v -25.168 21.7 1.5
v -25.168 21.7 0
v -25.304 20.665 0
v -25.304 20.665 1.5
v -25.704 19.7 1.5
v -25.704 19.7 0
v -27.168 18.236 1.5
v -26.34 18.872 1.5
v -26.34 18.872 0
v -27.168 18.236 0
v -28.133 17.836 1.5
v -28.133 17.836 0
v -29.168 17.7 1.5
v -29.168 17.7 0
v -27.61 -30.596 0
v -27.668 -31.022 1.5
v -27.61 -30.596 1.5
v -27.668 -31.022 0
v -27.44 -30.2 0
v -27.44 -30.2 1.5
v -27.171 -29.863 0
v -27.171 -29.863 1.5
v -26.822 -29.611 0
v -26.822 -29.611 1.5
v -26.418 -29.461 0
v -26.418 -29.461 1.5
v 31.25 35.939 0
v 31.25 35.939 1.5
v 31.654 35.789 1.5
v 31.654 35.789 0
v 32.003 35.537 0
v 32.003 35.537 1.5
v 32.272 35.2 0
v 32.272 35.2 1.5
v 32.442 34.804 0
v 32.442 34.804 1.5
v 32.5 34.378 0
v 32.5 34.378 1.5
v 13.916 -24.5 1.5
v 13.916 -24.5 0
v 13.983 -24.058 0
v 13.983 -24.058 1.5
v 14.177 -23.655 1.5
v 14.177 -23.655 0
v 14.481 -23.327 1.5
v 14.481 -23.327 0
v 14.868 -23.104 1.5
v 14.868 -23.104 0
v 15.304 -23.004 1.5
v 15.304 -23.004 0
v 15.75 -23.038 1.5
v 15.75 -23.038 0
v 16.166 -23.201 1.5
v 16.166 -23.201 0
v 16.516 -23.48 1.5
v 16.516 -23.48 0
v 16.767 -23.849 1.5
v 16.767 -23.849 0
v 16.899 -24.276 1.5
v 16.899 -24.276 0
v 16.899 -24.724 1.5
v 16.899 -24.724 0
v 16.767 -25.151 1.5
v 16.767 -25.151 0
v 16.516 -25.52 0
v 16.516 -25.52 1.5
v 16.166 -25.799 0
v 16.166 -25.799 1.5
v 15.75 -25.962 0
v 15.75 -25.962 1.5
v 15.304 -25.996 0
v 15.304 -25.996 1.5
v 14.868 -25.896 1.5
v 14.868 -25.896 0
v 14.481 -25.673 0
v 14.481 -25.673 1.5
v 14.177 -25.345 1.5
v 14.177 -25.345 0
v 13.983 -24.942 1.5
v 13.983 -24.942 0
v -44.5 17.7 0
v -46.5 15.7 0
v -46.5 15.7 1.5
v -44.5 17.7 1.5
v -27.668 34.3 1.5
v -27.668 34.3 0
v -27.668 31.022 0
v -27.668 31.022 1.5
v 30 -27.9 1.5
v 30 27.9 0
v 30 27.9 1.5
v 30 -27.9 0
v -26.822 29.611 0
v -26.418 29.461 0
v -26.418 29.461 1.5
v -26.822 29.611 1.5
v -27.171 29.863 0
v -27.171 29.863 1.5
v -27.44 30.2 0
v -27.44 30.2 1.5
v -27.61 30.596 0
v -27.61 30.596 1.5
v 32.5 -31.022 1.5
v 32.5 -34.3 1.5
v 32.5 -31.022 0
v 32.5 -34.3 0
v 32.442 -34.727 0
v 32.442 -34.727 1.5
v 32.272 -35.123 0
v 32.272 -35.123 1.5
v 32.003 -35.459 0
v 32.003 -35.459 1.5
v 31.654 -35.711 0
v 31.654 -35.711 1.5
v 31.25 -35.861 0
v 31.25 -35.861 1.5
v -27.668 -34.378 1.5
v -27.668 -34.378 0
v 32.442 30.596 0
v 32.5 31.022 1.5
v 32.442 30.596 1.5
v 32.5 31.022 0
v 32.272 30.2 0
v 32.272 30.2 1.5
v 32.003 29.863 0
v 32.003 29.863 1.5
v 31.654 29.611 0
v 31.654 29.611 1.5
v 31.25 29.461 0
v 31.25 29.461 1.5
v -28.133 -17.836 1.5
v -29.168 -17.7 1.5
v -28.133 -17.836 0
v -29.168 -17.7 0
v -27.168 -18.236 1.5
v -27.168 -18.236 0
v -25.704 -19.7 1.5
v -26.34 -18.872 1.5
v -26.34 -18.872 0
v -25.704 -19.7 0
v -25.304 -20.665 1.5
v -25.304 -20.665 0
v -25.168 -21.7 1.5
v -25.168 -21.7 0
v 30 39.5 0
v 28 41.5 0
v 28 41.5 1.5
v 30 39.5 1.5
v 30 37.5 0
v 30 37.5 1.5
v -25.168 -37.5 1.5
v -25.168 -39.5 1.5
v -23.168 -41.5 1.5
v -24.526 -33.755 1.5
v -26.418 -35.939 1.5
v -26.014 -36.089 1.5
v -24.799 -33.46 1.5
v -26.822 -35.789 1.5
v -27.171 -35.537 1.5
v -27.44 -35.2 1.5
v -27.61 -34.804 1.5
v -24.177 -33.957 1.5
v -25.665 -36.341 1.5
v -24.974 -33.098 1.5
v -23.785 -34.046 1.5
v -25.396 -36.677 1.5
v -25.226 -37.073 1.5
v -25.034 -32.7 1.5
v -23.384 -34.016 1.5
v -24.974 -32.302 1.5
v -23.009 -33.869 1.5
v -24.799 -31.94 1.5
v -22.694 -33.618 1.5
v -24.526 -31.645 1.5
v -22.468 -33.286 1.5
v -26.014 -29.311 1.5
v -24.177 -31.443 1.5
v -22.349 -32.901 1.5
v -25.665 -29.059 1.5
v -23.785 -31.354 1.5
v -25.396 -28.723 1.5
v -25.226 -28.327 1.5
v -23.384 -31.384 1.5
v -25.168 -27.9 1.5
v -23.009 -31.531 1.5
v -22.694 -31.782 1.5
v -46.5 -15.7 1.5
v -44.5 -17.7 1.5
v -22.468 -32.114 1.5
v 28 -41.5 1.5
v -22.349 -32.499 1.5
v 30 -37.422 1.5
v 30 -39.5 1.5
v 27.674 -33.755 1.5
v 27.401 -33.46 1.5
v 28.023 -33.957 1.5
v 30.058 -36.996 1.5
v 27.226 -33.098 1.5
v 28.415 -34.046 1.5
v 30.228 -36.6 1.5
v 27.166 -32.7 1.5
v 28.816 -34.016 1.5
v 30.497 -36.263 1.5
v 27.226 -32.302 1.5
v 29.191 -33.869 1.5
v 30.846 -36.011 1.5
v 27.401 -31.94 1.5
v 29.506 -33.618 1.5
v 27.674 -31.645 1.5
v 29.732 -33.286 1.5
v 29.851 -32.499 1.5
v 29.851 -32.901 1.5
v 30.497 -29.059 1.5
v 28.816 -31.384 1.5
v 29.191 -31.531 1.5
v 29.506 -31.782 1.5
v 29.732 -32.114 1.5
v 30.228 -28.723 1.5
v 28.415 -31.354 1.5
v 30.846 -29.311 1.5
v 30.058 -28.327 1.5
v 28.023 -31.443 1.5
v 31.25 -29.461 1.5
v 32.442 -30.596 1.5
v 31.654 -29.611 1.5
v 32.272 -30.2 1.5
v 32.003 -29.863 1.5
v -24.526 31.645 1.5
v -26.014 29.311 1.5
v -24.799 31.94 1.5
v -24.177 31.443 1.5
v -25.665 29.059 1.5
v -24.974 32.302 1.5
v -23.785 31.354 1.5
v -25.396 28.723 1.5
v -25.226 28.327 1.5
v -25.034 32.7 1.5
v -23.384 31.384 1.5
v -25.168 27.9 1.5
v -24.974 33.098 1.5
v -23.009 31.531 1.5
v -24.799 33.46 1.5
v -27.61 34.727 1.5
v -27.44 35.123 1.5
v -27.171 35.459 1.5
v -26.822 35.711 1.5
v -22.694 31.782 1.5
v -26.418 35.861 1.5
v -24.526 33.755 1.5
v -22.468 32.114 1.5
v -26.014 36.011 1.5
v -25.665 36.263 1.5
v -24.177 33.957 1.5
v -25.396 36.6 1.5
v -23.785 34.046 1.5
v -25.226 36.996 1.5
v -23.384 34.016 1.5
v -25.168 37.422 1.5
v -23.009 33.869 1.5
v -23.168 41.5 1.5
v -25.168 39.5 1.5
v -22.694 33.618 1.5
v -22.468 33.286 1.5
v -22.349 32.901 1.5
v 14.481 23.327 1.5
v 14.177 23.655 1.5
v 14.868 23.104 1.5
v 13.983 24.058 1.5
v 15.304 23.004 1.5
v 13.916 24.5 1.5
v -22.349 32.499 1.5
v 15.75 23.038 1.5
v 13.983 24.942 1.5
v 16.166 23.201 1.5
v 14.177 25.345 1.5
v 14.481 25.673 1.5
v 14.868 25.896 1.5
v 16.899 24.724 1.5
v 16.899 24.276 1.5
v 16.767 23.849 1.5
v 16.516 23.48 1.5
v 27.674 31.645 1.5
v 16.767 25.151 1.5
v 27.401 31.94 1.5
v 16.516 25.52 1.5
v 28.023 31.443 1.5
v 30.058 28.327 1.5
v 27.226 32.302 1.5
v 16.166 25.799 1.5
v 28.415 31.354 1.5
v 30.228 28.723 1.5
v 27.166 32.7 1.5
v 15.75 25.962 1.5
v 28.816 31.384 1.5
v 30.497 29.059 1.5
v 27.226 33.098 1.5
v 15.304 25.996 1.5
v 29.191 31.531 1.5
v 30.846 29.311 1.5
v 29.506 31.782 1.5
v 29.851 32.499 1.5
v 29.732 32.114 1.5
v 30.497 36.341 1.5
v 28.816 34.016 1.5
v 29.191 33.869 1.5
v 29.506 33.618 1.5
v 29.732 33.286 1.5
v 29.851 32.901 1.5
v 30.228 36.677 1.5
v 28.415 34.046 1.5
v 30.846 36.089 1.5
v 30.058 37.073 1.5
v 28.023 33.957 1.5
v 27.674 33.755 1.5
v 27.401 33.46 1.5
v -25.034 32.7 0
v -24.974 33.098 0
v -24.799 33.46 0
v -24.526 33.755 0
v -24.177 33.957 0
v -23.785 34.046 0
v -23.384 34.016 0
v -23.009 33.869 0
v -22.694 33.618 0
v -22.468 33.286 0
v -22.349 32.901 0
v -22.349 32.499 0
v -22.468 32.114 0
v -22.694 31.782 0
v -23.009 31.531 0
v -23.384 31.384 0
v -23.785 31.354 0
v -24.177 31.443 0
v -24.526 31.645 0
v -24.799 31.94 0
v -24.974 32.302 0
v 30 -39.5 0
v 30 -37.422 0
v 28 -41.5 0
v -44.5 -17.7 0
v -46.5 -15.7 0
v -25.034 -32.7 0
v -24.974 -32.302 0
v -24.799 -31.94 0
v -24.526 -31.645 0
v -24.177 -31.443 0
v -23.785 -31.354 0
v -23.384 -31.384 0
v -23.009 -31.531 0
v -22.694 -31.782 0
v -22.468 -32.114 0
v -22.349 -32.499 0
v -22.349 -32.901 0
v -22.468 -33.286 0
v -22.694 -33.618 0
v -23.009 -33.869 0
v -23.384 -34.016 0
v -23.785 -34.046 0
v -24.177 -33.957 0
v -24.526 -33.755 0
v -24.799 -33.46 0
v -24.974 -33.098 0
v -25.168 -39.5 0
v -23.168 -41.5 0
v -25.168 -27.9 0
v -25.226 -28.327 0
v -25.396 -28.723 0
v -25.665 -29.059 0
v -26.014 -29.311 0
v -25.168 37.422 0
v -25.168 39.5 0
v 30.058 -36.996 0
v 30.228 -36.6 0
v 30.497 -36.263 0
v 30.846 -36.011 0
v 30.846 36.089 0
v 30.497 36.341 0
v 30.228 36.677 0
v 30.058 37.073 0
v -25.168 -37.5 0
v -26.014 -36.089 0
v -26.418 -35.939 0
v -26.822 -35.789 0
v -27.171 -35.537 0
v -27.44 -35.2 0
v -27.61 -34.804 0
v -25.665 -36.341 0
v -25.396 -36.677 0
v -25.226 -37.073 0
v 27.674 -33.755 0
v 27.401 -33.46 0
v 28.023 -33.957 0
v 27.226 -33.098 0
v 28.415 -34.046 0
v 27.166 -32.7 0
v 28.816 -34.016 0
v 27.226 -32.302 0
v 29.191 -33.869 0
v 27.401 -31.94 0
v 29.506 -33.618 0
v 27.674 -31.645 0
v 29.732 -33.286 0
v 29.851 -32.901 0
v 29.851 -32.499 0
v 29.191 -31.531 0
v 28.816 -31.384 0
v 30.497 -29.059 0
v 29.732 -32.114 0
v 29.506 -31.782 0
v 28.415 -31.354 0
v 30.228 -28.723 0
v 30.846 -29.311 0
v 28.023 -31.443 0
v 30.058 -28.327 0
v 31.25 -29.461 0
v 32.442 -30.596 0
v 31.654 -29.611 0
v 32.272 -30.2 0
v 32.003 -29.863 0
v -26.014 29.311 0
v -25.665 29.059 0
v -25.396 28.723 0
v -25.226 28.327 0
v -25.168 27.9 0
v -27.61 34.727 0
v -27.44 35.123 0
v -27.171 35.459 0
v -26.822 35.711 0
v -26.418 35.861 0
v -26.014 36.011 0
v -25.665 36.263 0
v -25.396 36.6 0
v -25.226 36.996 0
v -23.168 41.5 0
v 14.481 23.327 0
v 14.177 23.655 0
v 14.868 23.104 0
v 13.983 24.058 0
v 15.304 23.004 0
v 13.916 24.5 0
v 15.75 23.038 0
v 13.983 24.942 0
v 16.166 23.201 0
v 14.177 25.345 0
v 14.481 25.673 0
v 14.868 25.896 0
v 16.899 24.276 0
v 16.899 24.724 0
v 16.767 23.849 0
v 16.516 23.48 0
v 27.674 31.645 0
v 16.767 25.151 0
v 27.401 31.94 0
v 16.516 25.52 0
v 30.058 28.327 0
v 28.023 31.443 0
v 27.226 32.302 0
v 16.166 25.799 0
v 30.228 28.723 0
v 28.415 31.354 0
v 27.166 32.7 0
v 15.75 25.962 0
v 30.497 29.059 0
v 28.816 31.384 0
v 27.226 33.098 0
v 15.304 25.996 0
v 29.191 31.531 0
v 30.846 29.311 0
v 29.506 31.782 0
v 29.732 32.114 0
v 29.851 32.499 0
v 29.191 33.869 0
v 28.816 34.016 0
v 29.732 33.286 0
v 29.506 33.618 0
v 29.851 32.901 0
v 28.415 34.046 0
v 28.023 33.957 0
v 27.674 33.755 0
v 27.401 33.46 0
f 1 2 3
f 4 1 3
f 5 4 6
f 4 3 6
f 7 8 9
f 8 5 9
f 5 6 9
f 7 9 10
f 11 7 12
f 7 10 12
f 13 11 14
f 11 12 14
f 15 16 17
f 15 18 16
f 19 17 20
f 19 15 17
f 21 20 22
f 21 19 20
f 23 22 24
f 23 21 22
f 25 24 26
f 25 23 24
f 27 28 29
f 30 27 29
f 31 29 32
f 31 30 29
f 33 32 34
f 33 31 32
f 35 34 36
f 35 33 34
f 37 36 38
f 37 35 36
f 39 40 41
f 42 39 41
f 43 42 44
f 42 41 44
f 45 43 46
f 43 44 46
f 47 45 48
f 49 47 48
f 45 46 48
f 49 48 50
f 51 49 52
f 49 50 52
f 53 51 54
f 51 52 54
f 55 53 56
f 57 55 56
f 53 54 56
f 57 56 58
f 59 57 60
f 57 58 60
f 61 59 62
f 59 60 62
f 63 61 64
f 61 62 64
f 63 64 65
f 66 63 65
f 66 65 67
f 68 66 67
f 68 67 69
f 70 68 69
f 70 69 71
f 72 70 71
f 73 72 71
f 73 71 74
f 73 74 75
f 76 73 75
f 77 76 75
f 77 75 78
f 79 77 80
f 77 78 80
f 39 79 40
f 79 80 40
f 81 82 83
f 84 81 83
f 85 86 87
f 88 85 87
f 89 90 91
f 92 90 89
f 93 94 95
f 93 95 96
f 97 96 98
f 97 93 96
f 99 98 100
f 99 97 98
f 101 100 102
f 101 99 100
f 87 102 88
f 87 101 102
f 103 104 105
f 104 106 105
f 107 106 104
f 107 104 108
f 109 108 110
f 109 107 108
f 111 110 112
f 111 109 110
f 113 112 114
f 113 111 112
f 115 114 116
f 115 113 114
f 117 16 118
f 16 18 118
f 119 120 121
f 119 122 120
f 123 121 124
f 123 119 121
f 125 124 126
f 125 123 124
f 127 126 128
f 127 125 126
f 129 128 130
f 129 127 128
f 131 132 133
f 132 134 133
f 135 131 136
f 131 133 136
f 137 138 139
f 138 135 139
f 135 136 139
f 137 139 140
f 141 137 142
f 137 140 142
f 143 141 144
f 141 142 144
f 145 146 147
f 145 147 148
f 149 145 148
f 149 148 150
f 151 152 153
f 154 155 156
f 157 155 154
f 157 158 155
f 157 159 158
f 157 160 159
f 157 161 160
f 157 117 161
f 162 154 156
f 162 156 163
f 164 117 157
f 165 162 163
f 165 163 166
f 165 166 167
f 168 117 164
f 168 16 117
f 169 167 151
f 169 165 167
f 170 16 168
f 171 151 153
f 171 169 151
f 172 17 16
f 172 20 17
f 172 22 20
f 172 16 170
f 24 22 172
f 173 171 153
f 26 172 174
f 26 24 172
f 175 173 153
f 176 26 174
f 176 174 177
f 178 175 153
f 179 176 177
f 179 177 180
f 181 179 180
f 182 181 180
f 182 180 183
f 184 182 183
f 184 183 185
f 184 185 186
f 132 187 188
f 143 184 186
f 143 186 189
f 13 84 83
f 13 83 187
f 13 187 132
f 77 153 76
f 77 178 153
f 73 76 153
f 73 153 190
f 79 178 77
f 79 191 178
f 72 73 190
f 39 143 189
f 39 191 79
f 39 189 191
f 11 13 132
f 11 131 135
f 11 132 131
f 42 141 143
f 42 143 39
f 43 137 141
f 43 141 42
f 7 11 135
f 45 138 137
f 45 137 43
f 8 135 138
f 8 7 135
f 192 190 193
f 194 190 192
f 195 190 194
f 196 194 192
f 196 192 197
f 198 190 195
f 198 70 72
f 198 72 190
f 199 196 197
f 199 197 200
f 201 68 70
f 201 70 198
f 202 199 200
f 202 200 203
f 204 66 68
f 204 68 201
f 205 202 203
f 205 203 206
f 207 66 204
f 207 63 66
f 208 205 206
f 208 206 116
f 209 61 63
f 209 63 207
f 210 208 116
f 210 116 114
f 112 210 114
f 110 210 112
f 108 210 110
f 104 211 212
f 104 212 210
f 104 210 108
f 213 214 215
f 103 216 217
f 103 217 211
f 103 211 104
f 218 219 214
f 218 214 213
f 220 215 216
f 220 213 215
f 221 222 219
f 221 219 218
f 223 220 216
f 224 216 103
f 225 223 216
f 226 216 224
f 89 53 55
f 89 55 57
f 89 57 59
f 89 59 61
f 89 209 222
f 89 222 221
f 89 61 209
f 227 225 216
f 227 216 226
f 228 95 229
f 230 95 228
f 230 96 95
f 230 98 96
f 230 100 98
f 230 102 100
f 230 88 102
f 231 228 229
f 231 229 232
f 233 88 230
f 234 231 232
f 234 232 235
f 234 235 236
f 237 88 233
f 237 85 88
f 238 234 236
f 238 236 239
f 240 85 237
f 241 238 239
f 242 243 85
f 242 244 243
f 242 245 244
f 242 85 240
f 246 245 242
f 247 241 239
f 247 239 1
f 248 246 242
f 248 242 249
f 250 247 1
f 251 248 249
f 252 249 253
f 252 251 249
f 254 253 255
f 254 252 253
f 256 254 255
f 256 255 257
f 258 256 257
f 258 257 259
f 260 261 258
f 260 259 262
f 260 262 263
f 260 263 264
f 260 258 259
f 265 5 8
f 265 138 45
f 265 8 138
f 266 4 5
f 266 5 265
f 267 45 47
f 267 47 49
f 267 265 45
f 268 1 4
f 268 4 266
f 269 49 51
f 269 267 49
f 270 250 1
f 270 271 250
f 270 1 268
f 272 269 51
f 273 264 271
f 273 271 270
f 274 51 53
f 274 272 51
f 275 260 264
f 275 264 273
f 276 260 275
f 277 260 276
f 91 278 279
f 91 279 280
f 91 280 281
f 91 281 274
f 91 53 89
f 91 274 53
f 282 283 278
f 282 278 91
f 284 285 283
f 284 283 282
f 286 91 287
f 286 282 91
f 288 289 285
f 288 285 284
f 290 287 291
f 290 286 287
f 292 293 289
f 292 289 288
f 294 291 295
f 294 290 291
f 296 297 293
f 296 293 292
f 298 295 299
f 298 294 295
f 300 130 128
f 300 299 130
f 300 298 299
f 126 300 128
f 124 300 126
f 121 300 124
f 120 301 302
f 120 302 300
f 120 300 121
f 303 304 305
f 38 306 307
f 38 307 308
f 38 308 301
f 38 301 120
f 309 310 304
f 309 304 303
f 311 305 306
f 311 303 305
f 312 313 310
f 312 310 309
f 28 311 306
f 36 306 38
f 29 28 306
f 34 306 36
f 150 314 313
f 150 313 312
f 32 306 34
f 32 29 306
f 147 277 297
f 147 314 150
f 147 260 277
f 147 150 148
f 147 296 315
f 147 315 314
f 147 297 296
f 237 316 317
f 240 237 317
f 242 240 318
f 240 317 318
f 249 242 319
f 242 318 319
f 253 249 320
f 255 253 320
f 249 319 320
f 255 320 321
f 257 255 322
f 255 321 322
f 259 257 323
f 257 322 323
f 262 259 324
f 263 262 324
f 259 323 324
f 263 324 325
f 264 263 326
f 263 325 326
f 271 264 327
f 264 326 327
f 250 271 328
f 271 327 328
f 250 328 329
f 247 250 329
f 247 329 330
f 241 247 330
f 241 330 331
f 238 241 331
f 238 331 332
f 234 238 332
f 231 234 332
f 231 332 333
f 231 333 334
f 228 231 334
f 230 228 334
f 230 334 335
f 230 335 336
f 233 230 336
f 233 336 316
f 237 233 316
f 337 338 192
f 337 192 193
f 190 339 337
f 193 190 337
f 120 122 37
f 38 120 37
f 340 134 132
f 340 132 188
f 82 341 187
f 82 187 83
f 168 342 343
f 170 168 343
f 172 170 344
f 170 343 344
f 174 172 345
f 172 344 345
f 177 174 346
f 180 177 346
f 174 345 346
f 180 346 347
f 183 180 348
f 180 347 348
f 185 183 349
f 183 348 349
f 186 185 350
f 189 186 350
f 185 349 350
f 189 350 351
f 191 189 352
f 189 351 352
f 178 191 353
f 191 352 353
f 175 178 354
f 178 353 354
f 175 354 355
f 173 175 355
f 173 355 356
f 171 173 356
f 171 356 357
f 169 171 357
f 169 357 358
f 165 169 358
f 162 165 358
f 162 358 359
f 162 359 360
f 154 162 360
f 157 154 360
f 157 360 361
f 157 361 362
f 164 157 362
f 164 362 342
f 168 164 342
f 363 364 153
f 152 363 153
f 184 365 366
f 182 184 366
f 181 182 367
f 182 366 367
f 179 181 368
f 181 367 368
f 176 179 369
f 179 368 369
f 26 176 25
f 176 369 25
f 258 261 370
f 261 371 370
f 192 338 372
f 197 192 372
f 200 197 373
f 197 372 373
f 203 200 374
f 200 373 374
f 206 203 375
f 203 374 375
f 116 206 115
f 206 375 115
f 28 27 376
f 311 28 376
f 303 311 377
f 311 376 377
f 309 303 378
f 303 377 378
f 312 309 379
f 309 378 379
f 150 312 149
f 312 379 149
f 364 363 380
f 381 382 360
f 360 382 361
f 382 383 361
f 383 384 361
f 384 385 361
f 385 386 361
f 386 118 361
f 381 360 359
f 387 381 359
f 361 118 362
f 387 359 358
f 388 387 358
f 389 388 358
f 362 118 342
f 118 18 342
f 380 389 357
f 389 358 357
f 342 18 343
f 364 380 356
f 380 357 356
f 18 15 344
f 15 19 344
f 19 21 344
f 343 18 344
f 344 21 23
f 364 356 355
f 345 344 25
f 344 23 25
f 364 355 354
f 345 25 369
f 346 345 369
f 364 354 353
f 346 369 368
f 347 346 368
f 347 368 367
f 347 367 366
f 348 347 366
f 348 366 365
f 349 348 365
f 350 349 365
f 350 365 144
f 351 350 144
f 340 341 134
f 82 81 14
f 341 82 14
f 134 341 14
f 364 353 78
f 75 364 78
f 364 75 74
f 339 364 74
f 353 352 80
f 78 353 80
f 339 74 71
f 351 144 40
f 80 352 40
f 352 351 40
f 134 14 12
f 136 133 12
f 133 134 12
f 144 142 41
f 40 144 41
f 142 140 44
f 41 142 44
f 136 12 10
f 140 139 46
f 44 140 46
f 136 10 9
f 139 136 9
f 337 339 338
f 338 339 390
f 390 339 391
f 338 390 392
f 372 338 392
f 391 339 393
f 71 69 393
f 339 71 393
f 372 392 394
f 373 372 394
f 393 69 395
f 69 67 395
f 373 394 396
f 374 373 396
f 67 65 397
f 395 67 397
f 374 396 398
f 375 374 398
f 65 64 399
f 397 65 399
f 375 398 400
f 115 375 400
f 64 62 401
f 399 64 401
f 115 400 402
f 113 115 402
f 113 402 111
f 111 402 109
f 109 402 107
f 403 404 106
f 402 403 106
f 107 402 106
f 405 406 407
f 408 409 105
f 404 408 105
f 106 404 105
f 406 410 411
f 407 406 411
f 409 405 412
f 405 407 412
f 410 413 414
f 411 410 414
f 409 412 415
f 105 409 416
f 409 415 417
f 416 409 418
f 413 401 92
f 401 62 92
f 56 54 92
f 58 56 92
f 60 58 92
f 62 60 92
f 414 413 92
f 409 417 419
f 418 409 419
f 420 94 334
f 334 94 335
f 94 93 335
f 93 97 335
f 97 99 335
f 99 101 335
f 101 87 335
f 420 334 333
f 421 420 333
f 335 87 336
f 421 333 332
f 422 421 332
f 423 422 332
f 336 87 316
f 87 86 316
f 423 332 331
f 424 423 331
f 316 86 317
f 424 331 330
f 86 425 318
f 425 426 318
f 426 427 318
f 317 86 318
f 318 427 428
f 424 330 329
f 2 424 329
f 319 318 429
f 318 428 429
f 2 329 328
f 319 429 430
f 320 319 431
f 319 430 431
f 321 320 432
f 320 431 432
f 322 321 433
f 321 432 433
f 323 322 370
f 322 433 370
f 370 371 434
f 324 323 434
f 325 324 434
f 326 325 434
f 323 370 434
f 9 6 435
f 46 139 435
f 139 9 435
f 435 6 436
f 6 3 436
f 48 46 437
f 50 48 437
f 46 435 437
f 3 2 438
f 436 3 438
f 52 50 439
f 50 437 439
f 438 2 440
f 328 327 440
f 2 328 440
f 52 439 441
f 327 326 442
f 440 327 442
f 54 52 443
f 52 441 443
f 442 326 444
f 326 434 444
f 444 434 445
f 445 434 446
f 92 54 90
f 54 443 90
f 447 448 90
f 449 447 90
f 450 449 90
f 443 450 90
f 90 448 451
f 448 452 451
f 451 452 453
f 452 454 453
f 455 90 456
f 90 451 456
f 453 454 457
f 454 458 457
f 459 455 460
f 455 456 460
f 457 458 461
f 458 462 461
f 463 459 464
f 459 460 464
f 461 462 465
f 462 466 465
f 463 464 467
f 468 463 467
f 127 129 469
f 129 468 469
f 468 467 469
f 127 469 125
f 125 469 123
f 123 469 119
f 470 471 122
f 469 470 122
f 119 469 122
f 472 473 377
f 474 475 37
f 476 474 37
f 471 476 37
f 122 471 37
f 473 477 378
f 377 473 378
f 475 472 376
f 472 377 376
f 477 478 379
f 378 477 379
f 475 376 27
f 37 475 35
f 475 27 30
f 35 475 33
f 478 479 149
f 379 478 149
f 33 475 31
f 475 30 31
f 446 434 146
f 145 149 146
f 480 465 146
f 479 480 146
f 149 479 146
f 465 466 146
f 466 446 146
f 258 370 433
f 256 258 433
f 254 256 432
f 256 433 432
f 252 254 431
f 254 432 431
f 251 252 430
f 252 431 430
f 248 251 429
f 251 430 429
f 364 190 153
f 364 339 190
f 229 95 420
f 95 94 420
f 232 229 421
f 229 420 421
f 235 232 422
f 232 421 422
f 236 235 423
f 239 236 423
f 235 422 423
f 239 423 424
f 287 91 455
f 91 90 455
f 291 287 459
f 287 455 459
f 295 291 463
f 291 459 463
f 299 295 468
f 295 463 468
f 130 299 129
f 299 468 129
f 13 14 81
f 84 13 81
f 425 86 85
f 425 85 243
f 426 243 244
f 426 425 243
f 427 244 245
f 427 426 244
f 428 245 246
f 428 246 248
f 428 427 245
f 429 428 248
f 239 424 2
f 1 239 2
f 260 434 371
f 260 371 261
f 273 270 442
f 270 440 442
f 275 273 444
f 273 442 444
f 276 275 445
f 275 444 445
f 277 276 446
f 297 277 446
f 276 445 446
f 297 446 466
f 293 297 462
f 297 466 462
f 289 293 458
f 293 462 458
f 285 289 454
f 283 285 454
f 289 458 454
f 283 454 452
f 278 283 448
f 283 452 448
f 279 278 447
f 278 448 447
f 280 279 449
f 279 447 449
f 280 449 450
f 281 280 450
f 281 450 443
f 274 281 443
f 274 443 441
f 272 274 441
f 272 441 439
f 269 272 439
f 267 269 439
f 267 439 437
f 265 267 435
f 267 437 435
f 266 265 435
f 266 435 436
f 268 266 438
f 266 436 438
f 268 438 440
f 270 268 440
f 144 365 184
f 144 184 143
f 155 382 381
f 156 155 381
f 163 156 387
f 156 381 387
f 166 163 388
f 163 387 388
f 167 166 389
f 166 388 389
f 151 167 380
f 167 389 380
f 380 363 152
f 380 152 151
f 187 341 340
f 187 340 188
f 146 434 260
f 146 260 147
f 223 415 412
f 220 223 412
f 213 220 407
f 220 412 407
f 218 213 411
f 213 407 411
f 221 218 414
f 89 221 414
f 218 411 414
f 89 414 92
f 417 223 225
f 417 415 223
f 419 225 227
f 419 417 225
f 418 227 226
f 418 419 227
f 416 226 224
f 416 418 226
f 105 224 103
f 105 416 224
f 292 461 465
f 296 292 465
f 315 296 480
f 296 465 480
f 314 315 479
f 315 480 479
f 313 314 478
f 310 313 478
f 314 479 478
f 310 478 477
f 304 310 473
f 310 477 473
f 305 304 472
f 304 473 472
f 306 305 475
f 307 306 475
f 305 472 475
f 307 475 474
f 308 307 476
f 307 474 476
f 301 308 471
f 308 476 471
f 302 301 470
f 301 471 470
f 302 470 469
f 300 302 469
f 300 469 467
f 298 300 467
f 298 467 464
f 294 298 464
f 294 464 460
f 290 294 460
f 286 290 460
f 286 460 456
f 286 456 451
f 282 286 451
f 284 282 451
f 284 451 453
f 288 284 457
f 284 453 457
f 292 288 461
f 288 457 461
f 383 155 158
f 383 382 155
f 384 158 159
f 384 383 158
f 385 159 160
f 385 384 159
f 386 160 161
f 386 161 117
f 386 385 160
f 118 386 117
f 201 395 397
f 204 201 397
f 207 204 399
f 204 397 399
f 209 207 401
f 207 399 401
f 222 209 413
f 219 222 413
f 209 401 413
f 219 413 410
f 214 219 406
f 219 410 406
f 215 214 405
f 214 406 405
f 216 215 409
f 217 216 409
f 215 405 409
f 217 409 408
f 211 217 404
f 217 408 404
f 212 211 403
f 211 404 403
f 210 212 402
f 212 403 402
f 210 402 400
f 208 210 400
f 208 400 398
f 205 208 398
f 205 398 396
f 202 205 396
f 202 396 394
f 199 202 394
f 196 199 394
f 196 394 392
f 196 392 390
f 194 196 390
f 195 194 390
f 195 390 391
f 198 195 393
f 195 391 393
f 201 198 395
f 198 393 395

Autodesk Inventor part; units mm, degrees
ref_plane "YZ Plane" through (0, 0, 0) normal (1, 0, 0) x (0, 1, 0)
ref_plane "XZ Plane" through (0, 0, 0) normal (0, 1, 0) x (-1, 0, 0)
ref_plane "XY Plane" through (0, 0, 0) normal (0, 0, 1) x (1, 0, 0)
sketch "Эскиз1" plane through (0, 0, 0) normal (0, 0, 1) x (1, 0, 0)
  line L0 (-30, 41.5) -> (28, 41.5)
  line L1 (30, 39.5) -> (30, -39.5)
  line L2 (28, -41.5) -> (-30, -41.5)
  line L3 (-30, -41.5) -> (-30, 41.5)
  line L4 (-30, 41.5) -> (30, -41.5) construction
  line L5 (30, 41.5) -> (-30, -41.5) construction
  line L6 (-30, -41.5) -> (-42.5, -41.5)
  line L7 (-46.5, -37.5) -> (-46.5, 37.5)
  line L8 (-42.5, 41.5) -> (-30, 41.5)
  line L9 (-30, 41.5) -> (-30, -41.5)
  line L10 (-42.5, -41.5) -> (-46.5, -37.5)
  line L11 (-46.5, 37.5) -> (-42.5, 41.5)
  line L12 (28, 41.5) -> (30, 39.5)
  line L13 (28, -41.5) -> (30, -39.5)
  line L14 (0, 0) -> (-23.984, 0) construction
  line L15 (-23.984, 0) -> (-23.984, 15.7) construction
  line L16 (-23.984, 15.7) -> (0, 15.7) construction
  line L17 (0, 15.7) -> (0, 0) construction
  circle A0 centre (-23.984, 15.7) radius 1.6
  circle A1 centre (-23.984, -15.7) radius 1.6
  circle A2 centre (23.984, 15.7) radius 1.6
  circle A3 centre (23.984, -15.7) radius 1.6
  line L18 (-46.5, -41.5) -> (-25.168, -41.5)
  line L19 (-25.168, -41.5) -> (-25.168, -21.7)
  line L20 (-29.168, -17.7) -> (-46.5, -17.7)
  line L21 (-46.5, -17.7) -> (-46.5, -41.5)
  arc A4 (-25.168, -21.7) -> (-29.168, -17.7) centre (-29.168, -21.7) ccw
  line L22 (-25.168, 41.5) -> (-25.168, 21.7)
  line L23 (-29.168, 17.7) -> (-46.5, 17.7)
  arc A5 (-29.168, 17.7) -> (-25.168, 21.7) centre (-29.168, 21.7) ccw
  point P0 (-46.5, 41.5)
  point P1 (-25.168, -17.7)
  point P2 (-25.168, 41.5)
  point P3 (-46.5, -17.7)
  point P4 (-25.168, -41.5)
  dimension "d0" = 60
  dimension "d1" = 83
  dimension "d2" = 16.5
  dimension "d3" = 83
  dimension "d6" = 4
  dimension "d7" = 4
  dimension "d8" = 4
  dimension "d9" = 4
  dimension "d10" = 2
  dimension "d11" = 2
  dimension "d12" = 2
  dimension "d13" = 2
  dimension "d14" = 23.984
  dimension "d15" = 15.7
  dimension "d16" = 3.2
  dimension "d17" = 21.332
  dimension "d18" = 23.8
  dimension "d19" = 4
extrude "Выдавливание1" add sketch "Эскиз1" along normal blind 1.5 contours L0 L12 L1 L13 L2 L19 A4 L20 L3 L23 A5 L22 | L3 L20 L7 L23 | A0 | A1 | A2 | A3
chamfer "Фаска1" distance 2 angle 45 4 edges at (-46.5, -17.7, 0.75) (-46.5, 17.7, 0.75) (-25.168, -41.5, 0.75) (-25.168, 41.5, 0.75)
sketch "Эскиз2" plane through (0, 0, 0) normal (0, 0, -1) x (-1, 0, 0)
  arc A0 (43.584, 19.7) -> (47.584, 23.7) centre (43.584, 23.7) ccw projected
  arc A1 (27.668, 34.3) -> (26.418, 35.8612) centre (26.068, 34.3) ccw projected
  line L0 (27.668, 34.3) -> (27.668, 31.0225) projected
  arc A2 (26.418, 29.4612) -> (27.668, 31.0225) centre (26.068, 31.0225) ccw projected
  arc A3 (26.418, 29.4612) -> (25.168, 27.9) centre (26.768, 27.9) ccw projected
  line L1 (25.168, 27.9) -> (25.168, 23.7) projected
  arc A4 (25.168, 23.7) -> (29.168, 19.7) centre (29.168, 23.7) ccw projected
  line L2 (29.168, 19.7) -> (43.584, 19.7) projected
  arc A5 (43.584, 19.7) -> (47.584, 23.7) centre (43.584, 23.7) ccw projected
  line L3 (47.584, 23.7) -> (47.584, 39.2) projected
  line L4 (47.584, 39.2) -> (25.168, 39.2) projected
  line L5 (25.168, 39.2) -> (25.168, 37.4225) projected
  arc A6 (25.168, 37.4225) -> (26.418, 35.8612) centre (26.768, 37.4225) ccw projected
  line L6 (52.084, -4) -> (58.0913, -4) projected
  line L7 (58.0913, -4) -> (58.0913, -38.5) projected
  line L8 (58.0913, -38.5) -> (69.3773, -38.5) projected
  line L9 (69.3773, -38.5) -> (69.3773, 32.5) projected
  line L10 (69.3773, 32.5) -> (58.0913, 32.5) projected
  line L11 (58.0913, 32.5) -> (58.0913, 24) projected
  line L12 (58.0913, 24) -> (52.084, 24) projected
  line L13 (52.084, 24) -> (52.084, 13.5) projected
  line L14 (52.084, 13.5) -> (34.584, 13.5) projected
  arc A7 (34.584, 13.5) -> (34.584, 1.5) centre (34.584, 7.5) ccw projected
  line L15 (34.584, 1.5) -> (47.084, 1.5) projected
  line L16 (47.084, 1.5) -> (47.084, -3.7639) projected
  spline S0 degree 3 poles (48.084, -6) (47.8036, -5.6035) (47.4716, -5.1246) (47.1717, -4.4032) (47.084, -4.0595) (47.084, -3.7639) knots 0.566831 0.566831 0.566831 0.566831 0.71252 0.71252 0.801197 0.801197 0.801197 0.801197 projected
  line L17 (51.084, -6) -> (48.084, -6) projected
  spline S1 degree 3 poles (52.084, -3.7639) (52.084, -4.0595) (51.9963, -4.4032) (51.6964, -5.1246) (51.3644, -5.6035) (51.084, -6) knots 0 0 0 0 0.088677 0.088677 0.234365 0.234365 0.234365 0.234365 projected
  line L18 (52.084, -3.7639) -> (52.084, -4) projected
  line L19 (74.484, -42.6) -> (-79.316, -42.6) projected
  line L20 (-79.316, -42.6) -> (-79.316, 42.6) projected
  line L21 (6.584, 42.6) -> (74.484, 42.6) projected
  line L22 (74.484, 42.6) -> (74.484, -42.6) projected
  circle A8 centre (23.684, -32.7) radius 1.6 projected
  circle A9 centre (23.684, 32.7) radius 1.6 projected
  line L23 (20.484, 41.2) -> (6.584, 41.2) projected
  line L24 (-25.316, 41.2) -> (-25.316, -41.2) projected
  line L25 (-25.316, -41.2) -> (20.484, -41.2) projected
  line L26 (20.484, -41.2) -> (20.484, 41.2) projected
  circle A10 centre (-28.516, -32.7) radius 1.6 projected
  circle A11 centre (-28.516, 32.7) radius 1.6 projected
  arc A12 (-32.5, 31.0225) -> (-31.25, 29.4612) centre (-30.9, 31.0225) ccw projected
  line L27 (-32.5, 31.0225) -> (-32.5, 34.3775) projected
  arc A13 (-31.25, 35.9388) -> (-32.5, 34.3775) centre (-30.9, 34.3775) ccw projected
  arc A14 (-31.25, 35.9388) -> (-30, 37.5) centre (-31.6, 37.5) ccw projected
  line L28 (-30, 37.5) -> (-30, 39.2) projected
  line L29 (-30, 39.2) -> (-52.416, 39.2) projected
  line L30 (-52.416, 39.2) -> (-52.416, 23.7) projected
  arc A15 (-52.416, 23.7) -> (-48.416, 19.7) centre (-48.416, 23.7) ccw projected
  line L31 (-48.416, 19.7) -> (-34, 19.7) projected
  arc A16 (-34, 19.7) -> (-30, 23.7) centre (-34, 23.7) ccw projected
  line L32 (-30, 23.7) -> (-30, 27.9) projected
  arc A17 (-30, 27.9) -> (-31.25, 29.4612) centre (-31.6, 27.9) ccw projected
  arc A18 (-32.5, -34.3) -> (-31.25, -35.8612) centre (-30.9, -34.3) ccw projected
  line L33 (-32.5, -34.3) -> (-32.5, -31.0225) projected
  arc A19 (-31.25, -29.4612) -> (-32.5, -31.0225) centre (-30.9, -31.0225) ccw projected
  arc A20 (-31.25, -29.4612) -> (-30, -27.9) centre (-31.6, -27.9) ccw projected
  line L34 (-30, -27.9) -> (-30, -23.7) projected
  arc A21 (-30, -23.7) -> (-34, -19.7) centre (-34, -23.7) ccw projected
  line L35 (-34, -19.7) -> (-48.416, -19.7) projected
  arc A22 (-48.416, -19.7) -> (-52.416, -23.7) centre (-48.416, -23.7) ccw projected
  line L36 (-52.416, -23.7) -> (-52.416, -39.2) projected
  line L37 (-52.416, -39.2) -> (-30, -39.2) projected
  line L38 (-30, -39.2) -> (-30, -37.4225) projected
  arc A23 (-30, -37.4225) -> (-31.25, -35.8612) centre (-31.6, -37.4225) ccw projected
  arc A24 (26.418, -35.9388) -> (27.668, -34.3775) centre (26.068, -34.3775) ccw projected
  arc A25 (26.418, -35.9388) -> (25.168, -37.5) centre (26.768, -37.5) ccw projected
  line L39 (25.168, -37.5) -> (25.168, -39.2) projected
  line L40 (25.168, -39.2) -> (47.584, -39.2) projected
  line L41 (47.584, -39.2) -> (47.584, -23.7) projected
  arc A26 (47.584, -23.7) -> (43.584, -19.7) centre (43.584, -23.7) ccw projected
  line L42 (43.584, -19.7) -> (29.168, -19.7) projected
  arc A27 (29.168, -19.7) -> (25.168, -21.7) centre (29.168, -23.7) ccw projected
  line L43 (25.168, -21.7) -> (25.168, -27.9) projected
  arc A28 (25.168, -27.9) -> (26.418, -29.4612) centre (26.768, -27.9) ccw projected
  arc A29 (27.668, -31.0225) -> (26.418, -29.4612) centre (26.068, -31.0225) ccw projected
  line L44 (27.668, -31.0225) -> (27.668, -34.3775) projected
  line L45 (25.168, -39.2) -> (25.168, 39.2)
  line L46 (25.168, -21.7) -> (25.168, -39.5) projected
  line L47 (-30, 39.2) -> (-30, -39.2)
  line L48 (-11.416, 42.6) -> (-11.416, 41.2) projected
  line L49 (-11.416, 41.2) -> (-25.316, 41.2) projected
  line L50 (6.584, 41.2) -> (6.584, 42.6) projected
  line L51 (-79.316, 42.6) -> (-11.416, 42.6) projected
  point P0 (0, 0)
  point P1 (-30, -37.4225)
  point P2 (-30, -27.9)
  point P3 (-30, 27.9)
  point P4 (-30, 37.5)
  point P5 (25.168, 37.4225)
  point P6 (25.168, 27.9)
  point P7 (25.168, -37.5)
  point P8 (25.168, -27.9)
extrude "Выдавливание2" add sketch "Эскиз2" against normal blind 1.5 contours L45 A9 A6 A1 L0 A2 A3 | L45 A9 | A28 A29 L44 A24 A25 L45 A8 | A8 L45 | L47 A10 | A10 L47 A23 A18 L33 A19 A20 | A17 A12 L27 A13 A14 L47 A11 | A11 L47 picked at (25.1894, 32.5653) picked at (25.1894, -32.5653) picked at (-30.0289, -32.5985) picked at (-30.0289, 32.8015)
sketch "Эскиз3" plane through (0, 0, 0) normal (0, 0, -1) x (-1, 0, 0)
  arc A0 (27.668, 34.3) -> (26.418, 35.8612) centre (26.068, 34.3) ccw projected
  line L0 (27.668, 34.3) -> (27.668, 31.0225) projected
  arc A1 (26.418, 29.4612) -> (27.668, 31.0225) centre (26.068, 31.0225) ccw projected
  arc A2 (26.418, 29.4612) -> (25.168, 27.9) centre (26.768, 27.9) ccw projected
  line L1 (25.168, 27.9) -> (25.168, 23.7) projected
  arc A3 (25.168, 23.7) -> (29.168, 19.7) centre (29.168, 23.7) ccw projected
  line L2 (29.168, 19.7) -> (43.584, 19.7) projected
  arc A4 (43.584, 19.7) -> (47.584, 23.7) centre (43.584, 23.7) ccw projected
  line L3 (47.584, 23.7) -> (47.584, 39.2) projected
  line L4 (47.584, 39.2) -> (25.168, 39.2) projected
  line L5 (25.168, 39.2) -> (25.168, 37.4225) projected
  arc A5 (25.168, 37.4225) -> (26.418, 35.8612) centre (26.768, 37.4225) ccw projected
  line L6 (52.084, -4) -> (58.0913, -4) projected
  line L7 (58.0913, -4) -> (58.0913, -38.5) projected
  line L8 (58.0913, -38.5) -> (69.3773, -38.5) projected
  line L9 (69.3773, -38.5) -> (69.3773, 32.5) projected
  line L10 (69.3773, 32.5) -> (58.0913, 32.5) projected
  line L11 (58.0913, 32.5) -> (58.0913, 24) projected
  line L12 (58.0913, 24) -> (52.084, 24) projected
  line L13 (52.084, 24) -> (52.084, 13.5) projected
  line L14 (52.084, 13.5) -> (34.584, 13.5) projected
  arc A6 (34.584, 13.5) -> (34.584, 1.5) centre (34.584, 7.5) ccw projected
  line L15 (34.584, 1.5) -> (47.084, 1.5) projected
  line L16 (47.084, 1.5) -> (47.084, -3.7639) projected
  spline S0 degree 3 poles (48.084, -6) (47.8036, -5.6035) (47.4716, -5.1246) (47.1717, -4.4032) (47.084, -4.0595) (47.084, -3.7639) knots 0.566831 0.566831 0.566831 0.566831 0.71252 0.71252 0.801197 0.801197 0.801197 0.801197 projected
  line L17 (51.084, -6) -> (48.084, -6) projected
  spline S1 degree 3 poles (52.084, -3.7639) (52.084, -4.0595) (51.9963, -4.4032) (51.6964, -5.1246) (51.3644, -5.6035) (51.084, -6) knots 0 0 0 0 0.088677 0.088677 0.234365 0.234365 0.234365 0.234365 projected
  line L18 (52.084, -3.7639) -> (52.084, -4) projected
  line L19 (74.484, -42.6) -> (-79.316, -42.6) projected
  line L20 (-79.316, -42.6) -> (-79.316, 42.6) projected
  line L21 (6.584, 42.6) -> (74.484, 42.6) projected
  line L22 (74.484, 42.6) -> (74.484, -42.6) projected
  circle A7 centre (23.684, -32.7) radius 1.6 projected
  circle A8 centre (23.684, 32.7) radius 1.6 projected
  line L23 (20.484, 41.2) -> (6.584, 41.2) projected
  line L24 (-25.316, 41.2) -> (-25.316, -41.2) projected
  line L25 (-25.316, -41.2) -> (20.484, -41.2) projected
  line L26 (20.484, -41.2) -> (20.484, 41.2) projected
  circle A9 centre (-28.516, -32.7) radius 1.6 projected
  circle A10 centre (-28.516, 32.7) radius 1.6 projected
  arc A11 (-32.5, 31.0225) -> (-31.25, 29.4612) centre (-30.9, 31.0225) ccw projected
  line L27 (-32.5, 31.0225) -> (-32.5, 34.3775) projected
  arc A12 (-31.25, 35.9388) -> (-32.5, 34.3775) centre (-30.9, 34.3775) ccw projected
  arc A13 (-31.25, 35.9388) -> (-30, 37.5) centre (-31.6, 37.5) ccw projected
  line L28 (-30, 37.5) -> (-30, 39.2) projected
  line L29 (-30, 39.2) -> (-52.416, 39.2) projected
  line L30 (-52.416, 39.2) -> (-52.416, 23.7) projected
  arc A14 (-52.416, 23.7) -> (-48.416, 19.7) centre (-48.416, 23.7) ccw projected
  line L31 (-48.416, 19.7) -> (-34, 19.7) projected
  arc A15 (-34, 19.7) -> (-30, 23.7) centre (-34, 23.7) ccw projected
  line L32 (-30, 23.7) -> (-30, 27.9) projected
  arc A16 (-30, 27.9) -> (-31.25, 29.4612) centre (-31.6, 27.9) ccw projected
  arc A17 (-32.5, -34.3) -> (-31.25, -35.8612) centre (-30.9, -34.3) ccw projected
  line L33 (-32.5, -34.3) -> (-32.5, -31.0225) projected
  arc A18 (-31.25, -29.4612) -> (-32.5, -31.0225) centre (-30.9, -31.0225) ccw projected
  arc A19 (-31.25, -29.4612) -> (-30, -27.9) centre (-31.6, -27.9) ccw projected
  line L34 (-30, -27.9) -> (-30, -23.7) projected
  arc A20 (-30, -23.7) -> (-34, -19.7) centre (-34, -23.7) ccw projected
  line L35 (-34, -19.7) -> (-48.416, -19.7) projected
  arc A21 (-48.416, -19.7) -> (-52.416, -23.7) centre (-48.416, -23.7) ccw projected
  line L36 (-52.416, -23.7) -> (-52.416, -39.2) projected
  line L37 (-52.416, -39.2) -> (-30, -39.2) projected
  line L38 (-30, -39.2) -> (-30, -37.4225) projected
  arc A22 (-30, -37.4225) -> (-31.25, -35.8612) centre (-31.6, -37.4225) ccw projected
  arc A23 (26.418, -35.9388) -> (27.668, -34.3775) centre (26.068, -34.3775) ccw projected
  arc A24 (26.418, -35.9388) -> (25.168, -37.5) centre (26.768, -37.5) ccw projected
  line L39 (25.168, -37.5) -> (25.168, -39.2) projected
  line L40 (25.168, -39.2) -> (47.584, -39.2) projected
  line L41 (47.584, -39.2) -> (47.584, -23.7) projected
  arc A25 (47.584, -23.7) -> (43.584, -19.7) centre (43.584, -23.7) ccw projected
  line L42 (43.584, -19.7) -> (29.168, -19.7) projected
  arc A26 (29.168, -19.7) -> (25.168, -23.7) centre (29.168, -23.7) ccw projected
  line L43 (25.168, -23.7) -> (25.168, -27.9) projected
  arc A27 (25.168, -27.9) -> (26.418, -29.4612) centre (26.768, -27.9) ccw projected
  arc A28 (27.668, -31.0225) -> (26.418, -29.4612) centre (26.068, -31.0225) ccw projected
  line L44 (27.668, -31.0225) -> (27.668, -34.3775) projected
  line L45 (25.168, -39.5) -> (23.168, -41.5) projected
  line L46 (23.168, -41.5) -> (25.168, -41.5) construction
  line L47 (25.168, -41.5) -> (25.168, -39.5) construction
  line L48 (25.168, -39.5) -> (23.168, -39.5) construction
  line L49 (23.168, -39.5) -> (23.168, -41.5) construction
  line L50 (25.168, -41.5) -> (-15.416, -41.5) construction
  line L51 (-15.416, -41.5) -> (-15.416, -24.5) construction
  line L52 (-15.416, -24.5) -> (25.168, -24.5) construction
  line L53 (25.168, -24.5) -> (25.168, -41.5) construction
  circle A29 centre (-15.416, -24.5) radius 1.5
  line L54 (-25.316, 0) -> (20.484, 0) construction
  circle A30 centre (-15.416, 24.5) radius 1.5
  circle A31 centre (23.684, -32.7) radius 1.35
  circle A32 centre (-28.516, -32.7) radius 1.35
  circle A33 centre (-28.516, 32.7) radius 1.35
  circle A34 centre (23.684, 32.7) radius 1.35
  line L55 (-11.416, 42.6) -> (-11.416, 41.2) projected
  line L56 (-11.416, 41.2) -> (-25.316, 41.2) projected
  line L57 (6.584, 41.2) -> (6.584, 42.6) projected
  line L58 (-79.316, 42.6) -> (-11.416, 42.6) projected
  point P0 (0, 0)
  dimension "d25" = 40.584
  dimension "d26" = 17
  dimension "d27" = 3
  dimension "d28" = 2.7
  dimension "d29" = 2.7
  dimension "d30" = 2.7
  dimension "d31" = 2.7
extrude "Выдавливание3" cut sketch "Эскиз3" against normal blind 1.5 contours A29 | A30 | A31 | A32 | A33 | A34
equation "\"d7\" = d6"
equation "\"d9\" = d8"
equation "\"d11\" = d10"
properties part number "power_board"
